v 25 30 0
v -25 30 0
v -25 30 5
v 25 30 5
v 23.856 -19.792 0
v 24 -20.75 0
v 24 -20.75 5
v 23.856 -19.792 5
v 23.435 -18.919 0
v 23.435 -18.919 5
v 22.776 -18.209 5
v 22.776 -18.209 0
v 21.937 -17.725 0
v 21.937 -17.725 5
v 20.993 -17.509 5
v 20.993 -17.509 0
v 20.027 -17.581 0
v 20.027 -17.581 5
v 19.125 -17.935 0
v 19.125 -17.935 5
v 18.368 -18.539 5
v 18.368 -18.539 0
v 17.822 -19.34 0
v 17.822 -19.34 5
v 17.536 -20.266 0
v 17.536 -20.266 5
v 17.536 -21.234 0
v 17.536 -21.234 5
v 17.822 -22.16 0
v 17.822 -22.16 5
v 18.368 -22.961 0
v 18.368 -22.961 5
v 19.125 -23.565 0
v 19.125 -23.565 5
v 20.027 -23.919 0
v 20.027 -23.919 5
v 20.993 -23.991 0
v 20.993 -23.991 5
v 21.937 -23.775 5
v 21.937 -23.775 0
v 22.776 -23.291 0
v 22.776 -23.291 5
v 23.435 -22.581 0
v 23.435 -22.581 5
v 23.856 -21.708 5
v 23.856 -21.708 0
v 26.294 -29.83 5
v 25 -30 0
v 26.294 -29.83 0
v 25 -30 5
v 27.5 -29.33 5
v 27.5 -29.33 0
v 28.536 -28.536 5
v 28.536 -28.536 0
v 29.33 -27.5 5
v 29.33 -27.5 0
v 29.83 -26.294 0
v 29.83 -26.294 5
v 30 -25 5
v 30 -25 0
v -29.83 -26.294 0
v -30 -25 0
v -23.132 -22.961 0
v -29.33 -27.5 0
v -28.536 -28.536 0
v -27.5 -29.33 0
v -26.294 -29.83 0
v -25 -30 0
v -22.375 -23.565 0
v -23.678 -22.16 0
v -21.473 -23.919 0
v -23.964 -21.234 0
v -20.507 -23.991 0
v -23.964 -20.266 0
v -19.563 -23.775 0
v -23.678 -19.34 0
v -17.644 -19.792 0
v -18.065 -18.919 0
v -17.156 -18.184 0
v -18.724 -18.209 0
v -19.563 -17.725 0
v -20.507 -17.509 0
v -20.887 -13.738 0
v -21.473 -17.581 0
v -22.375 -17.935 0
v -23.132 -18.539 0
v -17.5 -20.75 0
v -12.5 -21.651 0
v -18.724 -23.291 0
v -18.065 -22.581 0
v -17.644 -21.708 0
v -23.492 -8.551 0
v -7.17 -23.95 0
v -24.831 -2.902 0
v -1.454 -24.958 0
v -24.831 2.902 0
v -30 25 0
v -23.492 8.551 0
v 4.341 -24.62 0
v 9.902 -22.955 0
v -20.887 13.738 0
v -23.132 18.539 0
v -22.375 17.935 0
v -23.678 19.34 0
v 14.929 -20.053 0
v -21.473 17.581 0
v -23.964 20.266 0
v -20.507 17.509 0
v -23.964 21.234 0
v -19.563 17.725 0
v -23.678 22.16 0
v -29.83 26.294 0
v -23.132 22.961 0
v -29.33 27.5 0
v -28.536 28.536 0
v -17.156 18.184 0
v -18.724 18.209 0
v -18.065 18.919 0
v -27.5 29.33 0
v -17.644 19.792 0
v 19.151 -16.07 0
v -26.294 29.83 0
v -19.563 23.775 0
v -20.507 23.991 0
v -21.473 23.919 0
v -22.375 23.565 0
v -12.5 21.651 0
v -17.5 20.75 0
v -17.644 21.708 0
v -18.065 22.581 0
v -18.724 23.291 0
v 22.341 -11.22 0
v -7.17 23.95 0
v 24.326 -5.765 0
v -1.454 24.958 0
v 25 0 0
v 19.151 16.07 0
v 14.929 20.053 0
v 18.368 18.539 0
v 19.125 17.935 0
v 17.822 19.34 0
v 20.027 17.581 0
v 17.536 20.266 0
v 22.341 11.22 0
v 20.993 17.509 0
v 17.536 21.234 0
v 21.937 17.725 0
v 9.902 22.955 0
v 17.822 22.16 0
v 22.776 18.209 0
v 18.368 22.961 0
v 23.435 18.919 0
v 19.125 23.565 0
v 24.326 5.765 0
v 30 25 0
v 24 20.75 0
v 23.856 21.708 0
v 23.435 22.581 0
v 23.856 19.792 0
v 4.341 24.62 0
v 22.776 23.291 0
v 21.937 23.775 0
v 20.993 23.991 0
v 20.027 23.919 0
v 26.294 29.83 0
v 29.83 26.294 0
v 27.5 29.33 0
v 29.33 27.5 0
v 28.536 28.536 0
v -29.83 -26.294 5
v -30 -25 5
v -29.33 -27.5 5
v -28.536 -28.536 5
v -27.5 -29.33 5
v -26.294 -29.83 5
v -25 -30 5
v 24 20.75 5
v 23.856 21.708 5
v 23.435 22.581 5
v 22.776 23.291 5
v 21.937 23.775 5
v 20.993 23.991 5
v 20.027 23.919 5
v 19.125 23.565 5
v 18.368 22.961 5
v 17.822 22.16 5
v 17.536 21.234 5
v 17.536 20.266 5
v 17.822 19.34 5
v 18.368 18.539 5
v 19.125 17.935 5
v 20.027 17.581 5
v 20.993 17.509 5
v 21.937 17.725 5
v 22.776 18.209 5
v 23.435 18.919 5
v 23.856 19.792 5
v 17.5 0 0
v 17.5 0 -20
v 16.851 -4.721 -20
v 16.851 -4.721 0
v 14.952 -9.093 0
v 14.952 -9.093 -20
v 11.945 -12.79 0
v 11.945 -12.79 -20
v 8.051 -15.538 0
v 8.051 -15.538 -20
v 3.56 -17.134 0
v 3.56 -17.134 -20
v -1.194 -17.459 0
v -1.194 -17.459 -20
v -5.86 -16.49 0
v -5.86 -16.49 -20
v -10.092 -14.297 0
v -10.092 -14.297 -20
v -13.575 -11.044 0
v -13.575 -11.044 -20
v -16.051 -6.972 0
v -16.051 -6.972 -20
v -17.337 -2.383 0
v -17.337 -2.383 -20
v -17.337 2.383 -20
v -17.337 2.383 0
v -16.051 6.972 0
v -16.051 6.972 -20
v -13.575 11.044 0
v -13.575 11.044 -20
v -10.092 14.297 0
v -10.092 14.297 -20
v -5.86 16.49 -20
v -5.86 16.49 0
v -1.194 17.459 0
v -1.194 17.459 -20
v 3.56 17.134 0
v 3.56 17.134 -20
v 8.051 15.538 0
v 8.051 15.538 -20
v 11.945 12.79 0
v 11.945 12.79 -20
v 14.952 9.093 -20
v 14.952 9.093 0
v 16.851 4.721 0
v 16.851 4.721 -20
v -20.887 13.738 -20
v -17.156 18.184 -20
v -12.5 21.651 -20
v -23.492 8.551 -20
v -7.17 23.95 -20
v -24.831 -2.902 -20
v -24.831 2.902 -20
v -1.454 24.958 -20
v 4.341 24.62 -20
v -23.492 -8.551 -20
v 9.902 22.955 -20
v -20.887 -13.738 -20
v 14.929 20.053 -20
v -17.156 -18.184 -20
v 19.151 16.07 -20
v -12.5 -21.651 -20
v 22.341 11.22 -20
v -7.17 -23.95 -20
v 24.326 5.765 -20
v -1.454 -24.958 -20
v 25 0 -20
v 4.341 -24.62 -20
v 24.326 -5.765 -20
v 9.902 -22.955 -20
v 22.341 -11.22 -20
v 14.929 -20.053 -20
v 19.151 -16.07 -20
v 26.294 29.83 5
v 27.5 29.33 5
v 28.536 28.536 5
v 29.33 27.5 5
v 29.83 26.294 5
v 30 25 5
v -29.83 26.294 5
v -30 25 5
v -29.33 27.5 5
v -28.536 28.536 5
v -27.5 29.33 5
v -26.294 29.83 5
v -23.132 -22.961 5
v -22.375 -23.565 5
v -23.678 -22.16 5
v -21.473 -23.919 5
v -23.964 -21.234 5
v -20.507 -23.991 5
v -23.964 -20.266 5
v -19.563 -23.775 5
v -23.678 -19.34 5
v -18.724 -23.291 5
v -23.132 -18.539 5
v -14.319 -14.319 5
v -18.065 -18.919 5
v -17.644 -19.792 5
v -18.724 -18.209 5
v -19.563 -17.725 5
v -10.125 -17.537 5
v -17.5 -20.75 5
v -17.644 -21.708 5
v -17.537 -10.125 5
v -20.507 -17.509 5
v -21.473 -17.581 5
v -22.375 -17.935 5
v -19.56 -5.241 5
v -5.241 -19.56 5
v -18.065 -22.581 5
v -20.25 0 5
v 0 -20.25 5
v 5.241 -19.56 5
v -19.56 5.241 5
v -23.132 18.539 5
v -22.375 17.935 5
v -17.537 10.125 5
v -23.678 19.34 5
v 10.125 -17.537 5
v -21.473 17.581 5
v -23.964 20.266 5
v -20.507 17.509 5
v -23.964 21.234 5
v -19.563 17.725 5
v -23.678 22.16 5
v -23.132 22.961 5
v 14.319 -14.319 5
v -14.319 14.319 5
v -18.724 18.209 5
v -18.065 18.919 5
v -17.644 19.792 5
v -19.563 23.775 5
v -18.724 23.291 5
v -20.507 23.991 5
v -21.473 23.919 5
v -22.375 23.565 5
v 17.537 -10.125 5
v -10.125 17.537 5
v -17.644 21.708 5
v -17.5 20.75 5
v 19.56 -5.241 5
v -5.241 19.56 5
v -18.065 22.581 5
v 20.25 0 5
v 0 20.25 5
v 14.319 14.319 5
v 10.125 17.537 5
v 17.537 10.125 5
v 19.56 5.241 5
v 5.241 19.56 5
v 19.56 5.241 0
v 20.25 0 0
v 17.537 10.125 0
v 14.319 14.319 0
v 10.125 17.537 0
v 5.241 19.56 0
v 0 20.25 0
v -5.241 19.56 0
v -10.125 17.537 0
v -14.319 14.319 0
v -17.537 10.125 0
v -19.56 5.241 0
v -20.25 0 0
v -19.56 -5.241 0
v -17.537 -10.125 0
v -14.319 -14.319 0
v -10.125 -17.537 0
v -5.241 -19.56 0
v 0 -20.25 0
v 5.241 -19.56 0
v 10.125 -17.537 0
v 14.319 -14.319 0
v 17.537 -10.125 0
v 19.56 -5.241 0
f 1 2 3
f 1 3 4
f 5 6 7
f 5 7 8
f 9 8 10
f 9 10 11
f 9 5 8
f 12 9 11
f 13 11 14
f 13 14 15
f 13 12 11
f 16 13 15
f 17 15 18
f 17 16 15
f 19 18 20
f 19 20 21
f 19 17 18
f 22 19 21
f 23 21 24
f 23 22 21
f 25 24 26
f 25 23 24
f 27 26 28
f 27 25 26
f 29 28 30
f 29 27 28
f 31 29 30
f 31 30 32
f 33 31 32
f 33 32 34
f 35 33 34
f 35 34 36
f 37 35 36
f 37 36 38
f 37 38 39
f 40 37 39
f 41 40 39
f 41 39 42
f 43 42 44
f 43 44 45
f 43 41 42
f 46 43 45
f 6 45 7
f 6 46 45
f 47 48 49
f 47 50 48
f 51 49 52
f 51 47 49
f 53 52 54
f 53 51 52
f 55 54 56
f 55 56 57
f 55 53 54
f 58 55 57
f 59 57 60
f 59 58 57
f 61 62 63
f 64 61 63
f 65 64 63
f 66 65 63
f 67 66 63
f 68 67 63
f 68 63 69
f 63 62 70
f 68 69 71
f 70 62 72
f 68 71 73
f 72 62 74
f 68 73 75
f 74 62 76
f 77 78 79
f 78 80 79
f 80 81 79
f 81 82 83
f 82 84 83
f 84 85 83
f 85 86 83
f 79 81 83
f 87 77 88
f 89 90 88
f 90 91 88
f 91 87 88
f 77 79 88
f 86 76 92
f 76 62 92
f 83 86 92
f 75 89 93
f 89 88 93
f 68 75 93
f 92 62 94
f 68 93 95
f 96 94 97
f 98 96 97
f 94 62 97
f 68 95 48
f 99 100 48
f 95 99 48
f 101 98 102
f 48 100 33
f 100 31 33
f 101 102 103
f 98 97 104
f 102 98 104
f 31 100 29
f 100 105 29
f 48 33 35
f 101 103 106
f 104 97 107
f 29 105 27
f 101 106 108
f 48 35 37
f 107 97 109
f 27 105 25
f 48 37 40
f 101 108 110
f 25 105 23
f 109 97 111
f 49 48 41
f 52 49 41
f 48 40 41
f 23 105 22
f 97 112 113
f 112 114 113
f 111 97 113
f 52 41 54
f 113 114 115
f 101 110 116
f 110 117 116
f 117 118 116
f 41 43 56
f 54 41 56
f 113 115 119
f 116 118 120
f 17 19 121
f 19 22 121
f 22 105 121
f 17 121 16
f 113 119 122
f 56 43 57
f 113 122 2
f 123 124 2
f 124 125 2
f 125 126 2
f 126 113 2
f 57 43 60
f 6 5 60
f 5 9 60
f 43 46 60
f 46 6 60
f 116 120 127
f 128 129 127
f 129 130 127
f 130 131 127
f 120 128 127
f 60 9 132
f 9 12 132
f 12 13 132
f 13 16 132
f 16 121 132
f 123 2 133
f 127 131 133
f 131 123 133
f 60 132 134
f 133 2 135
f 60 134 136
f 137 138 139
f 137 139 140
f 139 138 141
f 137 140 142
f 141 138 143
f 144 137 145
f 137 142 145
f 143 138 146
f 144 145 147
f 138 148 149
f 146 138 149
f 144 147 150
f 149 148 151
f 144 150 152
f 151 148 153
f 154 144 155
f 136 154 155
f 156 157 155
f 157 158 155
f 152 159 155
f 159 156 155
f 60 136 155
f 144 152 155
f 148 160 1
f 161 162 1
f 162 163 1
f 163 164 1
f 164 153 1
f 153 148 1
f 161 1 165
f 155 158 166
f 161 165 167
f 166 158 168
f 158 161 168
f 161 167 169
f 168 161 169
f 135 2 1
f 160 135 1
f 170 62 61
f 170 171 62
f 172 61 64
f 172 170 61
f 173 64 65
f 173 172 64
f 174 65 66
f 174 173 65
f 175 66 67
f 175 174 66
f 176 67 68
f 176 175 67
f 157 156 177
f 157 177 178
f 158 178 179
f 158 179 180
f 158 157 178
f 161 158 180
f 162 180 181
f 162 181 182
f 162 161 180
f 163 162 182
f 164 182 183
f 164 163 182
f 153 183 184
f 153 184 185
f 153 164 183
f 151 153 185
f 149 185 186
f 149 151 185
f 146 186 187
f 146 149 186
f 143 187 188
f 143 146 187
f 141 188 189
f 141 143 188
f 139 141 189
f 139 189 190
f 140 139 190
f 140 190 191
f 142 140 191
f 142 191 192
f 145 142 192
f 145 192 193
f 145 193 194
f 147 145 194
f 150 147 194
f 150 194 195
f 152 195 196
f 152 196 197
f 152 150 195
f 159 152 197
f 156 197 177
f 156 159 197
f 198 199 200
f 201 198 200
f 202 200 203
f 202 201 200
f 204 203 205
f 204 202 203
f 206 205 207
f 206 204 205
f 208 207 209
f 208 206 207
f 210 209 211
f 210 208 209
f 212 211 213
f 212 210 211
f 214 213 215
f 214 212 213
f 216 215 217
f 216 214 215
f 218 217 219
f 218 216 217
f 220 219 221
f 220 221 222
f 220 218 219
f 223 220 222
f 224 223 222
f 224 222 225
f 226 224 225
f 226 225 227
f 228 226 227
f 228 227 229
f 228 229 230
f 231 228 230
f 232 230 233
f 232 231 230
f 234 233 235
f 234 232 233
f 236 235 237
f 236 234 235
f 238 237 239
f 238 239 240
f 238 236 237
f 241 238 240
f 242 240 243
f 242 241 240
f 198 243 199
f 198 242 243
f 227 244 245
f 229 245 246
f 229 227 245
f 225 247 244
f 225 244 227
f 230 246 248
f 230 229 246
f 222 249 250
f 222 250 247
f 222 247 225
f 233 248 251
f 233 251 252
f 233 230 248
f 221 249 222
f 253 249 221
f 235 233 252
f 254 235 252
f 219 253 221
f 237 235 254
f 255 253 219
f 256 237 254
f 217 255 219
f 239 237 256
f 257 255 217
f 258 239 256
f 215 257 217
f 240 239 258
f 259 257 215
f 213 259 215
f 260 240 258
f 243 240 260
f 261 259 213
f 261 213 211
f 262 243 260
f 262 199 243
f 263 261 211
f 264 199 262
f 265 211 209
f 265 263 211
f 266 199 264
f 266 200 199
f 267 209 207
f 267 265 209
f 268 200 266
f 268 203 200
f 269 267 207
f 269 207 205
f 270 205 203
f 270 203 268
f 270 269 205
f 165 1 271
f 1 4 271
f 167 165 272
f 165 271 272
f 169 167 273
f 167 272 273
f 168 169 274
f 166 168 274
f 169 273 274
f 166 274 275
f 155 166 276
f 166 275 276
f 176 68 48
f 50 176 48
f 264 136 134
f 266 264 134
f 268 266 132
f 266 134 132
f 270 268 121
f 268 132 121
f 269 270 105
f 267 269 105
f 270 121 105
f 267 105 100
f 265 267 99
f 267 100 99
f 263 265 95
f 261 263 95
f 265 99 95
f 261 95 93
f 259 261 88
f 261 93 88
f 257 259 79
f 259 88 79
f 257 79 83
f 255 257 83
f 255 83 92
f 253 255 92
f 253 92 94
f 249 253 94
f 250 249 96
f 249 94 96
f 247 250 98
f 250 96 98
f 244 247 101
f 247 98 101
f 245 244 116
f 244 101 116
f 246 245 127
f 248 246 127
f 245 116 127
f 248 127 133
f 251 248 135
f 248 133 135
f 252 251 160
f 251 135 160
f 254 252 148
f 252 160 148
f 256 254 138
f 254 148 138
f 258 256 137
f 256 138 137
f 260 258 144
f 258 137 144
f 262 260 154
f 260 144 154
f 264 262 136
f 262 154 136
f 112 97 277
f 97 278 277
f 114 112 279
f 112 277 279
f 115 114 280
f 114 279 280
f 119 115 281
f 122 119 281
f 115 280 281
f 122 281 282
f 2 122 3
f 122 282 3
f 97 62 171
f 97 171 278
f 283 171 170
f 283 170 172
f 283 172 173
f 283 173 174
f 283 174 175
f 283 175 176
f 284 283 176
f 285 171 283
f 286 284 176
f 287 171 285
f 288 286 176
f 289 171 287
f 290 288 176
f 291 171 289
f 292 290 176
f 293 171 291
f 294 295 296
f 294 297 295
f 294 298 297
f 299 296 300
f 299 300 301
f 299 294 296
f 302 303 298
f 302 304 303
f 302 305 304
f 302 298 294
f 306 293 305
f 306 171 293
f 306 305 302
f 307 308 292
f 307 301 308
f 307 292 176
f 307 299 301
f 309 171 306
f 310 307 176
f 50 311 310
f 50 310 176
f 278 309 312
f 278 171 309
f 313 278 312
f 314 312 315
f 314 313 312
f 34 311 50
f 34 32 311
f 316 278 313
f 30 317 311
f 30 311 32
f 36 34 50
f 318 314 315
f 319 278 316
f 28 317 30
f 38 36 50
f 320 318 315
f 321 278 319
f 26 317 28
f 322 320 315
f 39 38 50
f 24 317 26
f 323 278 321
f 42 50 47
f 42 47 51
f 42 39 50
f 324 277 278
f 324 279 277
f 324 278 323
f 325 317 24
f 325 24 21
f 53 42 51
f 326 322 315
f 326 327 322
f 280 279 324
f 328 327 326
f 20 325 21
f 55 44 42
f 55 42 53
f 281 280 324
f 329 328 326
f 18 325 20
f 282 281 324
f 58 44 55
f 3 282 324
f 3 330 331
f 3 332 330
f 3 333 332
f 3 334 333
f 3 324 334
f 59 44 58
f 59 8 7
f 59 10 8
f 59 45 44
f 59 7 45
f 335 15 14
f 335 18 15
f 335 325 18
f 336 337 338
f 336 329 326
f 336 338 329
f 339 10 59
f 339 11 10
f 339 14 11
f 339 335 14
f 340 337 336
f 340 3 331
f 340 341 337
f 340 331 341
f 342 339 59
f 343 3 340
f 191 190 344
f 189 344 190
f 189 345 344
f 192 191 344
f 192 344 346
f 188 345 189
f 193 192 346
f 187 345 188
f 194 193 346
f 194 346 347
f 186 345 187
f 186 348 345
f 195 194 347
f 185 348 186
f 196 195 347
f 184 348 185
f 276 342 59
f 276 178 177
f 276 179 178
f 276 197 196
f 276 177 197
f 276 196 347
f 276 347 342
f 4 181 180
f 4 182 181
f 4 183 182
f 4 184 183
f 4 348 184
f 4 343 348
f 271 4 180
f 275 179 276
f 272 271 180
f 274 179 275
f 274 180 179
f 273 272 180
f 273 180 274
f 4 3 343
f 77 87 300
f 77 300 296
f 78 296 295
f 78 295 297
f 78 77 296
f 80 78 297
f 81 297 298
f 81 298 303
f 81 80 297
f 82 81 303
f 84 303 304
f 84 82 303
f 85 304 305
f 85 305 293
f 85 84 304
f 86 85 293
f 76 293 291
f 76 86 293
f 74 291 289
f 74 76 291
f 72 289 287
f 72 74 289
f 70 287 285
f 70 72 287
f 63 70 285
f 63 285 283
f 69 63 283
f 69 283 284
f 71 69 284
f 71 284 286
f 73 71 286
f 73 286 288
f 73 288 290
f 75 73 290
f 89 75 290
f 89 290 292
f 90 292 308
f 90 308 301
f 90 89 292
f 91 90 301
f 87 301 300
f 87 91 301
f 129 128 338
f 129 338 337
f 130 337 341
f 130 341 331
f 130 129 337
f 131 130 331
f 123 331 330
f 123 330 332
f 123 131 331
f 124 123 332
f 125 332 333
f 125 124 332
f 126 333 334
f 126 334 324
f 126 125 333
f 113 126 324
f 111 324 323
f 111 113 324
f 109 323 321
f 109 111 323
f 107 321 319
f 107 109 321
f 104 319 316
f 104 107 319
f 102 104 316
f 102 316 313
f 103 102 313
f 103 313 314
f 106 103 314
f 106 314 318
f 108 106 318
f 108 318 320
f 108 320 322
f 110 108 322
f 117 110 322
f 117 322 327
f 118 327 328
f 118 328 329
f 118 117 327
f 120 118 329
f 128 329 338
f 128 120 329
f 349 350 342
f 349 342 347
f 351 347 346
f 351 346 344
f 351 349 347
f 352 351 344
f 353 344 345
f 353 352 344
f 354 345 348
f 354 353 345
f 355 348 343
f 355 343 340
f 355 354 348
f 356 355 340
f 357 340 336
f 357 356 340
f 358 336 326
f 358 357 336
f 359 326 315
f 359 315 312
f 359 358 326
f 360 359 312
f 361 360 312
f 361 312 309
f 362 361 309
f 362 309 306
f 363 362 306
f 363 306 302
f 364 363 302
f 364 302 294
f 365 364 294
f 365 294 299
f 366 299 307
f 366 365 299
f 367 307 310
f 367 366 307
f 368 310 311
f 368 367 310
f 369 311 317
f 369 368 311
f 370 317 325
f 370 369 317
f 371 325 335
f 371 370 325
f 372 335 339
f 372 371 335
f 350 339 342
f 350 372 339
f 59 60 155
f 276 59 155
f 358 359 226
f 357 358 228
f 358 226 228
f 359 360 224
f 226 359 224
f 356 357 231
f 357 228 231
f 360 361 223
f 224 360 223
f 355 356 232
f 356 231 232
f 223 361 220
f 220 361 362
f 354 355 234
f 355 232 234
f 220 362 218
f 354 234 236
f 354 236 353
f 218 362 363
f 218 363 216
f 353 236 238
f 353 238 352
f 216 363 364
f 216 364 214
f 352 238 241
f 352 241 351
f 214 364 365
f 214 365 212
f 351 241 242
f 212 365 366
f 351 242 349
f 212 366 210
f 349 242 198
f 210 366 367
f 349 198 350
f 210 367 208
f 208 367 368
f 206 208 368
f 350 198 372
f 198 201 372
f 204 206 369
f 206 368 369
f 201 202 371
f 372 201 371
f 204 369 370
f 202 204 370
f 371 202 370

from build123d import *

# Parameters (mm, degrees)
F0_W     = 60
F0_H     = 60
F0_R     = 3.25
F0_R_2   = 20.25
F1_DEPTH = 5
F2_R     = 5
F3_R     = 19.5
F4_DEPTH = 5
F5_R     = 25
F5_R_2   = 17.5
F6_DEPTH = 20


with BuildPart() as f1:
    # F0 (on Top) → F1 (new body)
    with BuildSketch(Plane.XY):
        Rectangle(F0_W, F0_H)
        with Locations((-20.75, -20.75)):
            Circle(F0_R, mode=Mode.SUBTRACT)
        with Locations((20.75, -20.75)):
            Circle(F0_R, mode=Mode.SUBTRACT)
        with Locations((-20.75, 20.75)):
            Circle(F0_R, mode=Mode.SUBTRACT)
        Circle(F0_R_2, mode=Mode.SUBTRACT)
        with Locations((20.75, 20.75)):
            Circle(F0_R, mode=Mode.SUBTRACT)
    extrude(amount=F1_DEPTH)

    # F2
    f2_edges = [f1.edges().sort_by_distance(p)[0] for p in [
        (-30, -30, 2.5),
        (30, -30, 2.5),
        (30, 30, 2.5),
        (-30, 30, 2.5),
    ]]
    fillet(f2_edges, radius=F2_R)

    # F3 (on face) → F4 (cut)
    with BuildSketch(Plane.XY.offset(5)):
        Circle(F3_R)
    extrude(amount=-F4_DEPTH, mode=Mode.SUBTRACT)

    # F5 (on face) → F6 (join)
    with BuildSketch(Plane(origin=(0, 0, 0), x_dir=(1, 0, 0), z_dir=(0, 0, -1))):
        Circle(F5_R)
        Circle(F5_R_2, mode=Mode.SUBTRACT)
    extrude(amount=F6_DEPTH)


solid = f1.part
